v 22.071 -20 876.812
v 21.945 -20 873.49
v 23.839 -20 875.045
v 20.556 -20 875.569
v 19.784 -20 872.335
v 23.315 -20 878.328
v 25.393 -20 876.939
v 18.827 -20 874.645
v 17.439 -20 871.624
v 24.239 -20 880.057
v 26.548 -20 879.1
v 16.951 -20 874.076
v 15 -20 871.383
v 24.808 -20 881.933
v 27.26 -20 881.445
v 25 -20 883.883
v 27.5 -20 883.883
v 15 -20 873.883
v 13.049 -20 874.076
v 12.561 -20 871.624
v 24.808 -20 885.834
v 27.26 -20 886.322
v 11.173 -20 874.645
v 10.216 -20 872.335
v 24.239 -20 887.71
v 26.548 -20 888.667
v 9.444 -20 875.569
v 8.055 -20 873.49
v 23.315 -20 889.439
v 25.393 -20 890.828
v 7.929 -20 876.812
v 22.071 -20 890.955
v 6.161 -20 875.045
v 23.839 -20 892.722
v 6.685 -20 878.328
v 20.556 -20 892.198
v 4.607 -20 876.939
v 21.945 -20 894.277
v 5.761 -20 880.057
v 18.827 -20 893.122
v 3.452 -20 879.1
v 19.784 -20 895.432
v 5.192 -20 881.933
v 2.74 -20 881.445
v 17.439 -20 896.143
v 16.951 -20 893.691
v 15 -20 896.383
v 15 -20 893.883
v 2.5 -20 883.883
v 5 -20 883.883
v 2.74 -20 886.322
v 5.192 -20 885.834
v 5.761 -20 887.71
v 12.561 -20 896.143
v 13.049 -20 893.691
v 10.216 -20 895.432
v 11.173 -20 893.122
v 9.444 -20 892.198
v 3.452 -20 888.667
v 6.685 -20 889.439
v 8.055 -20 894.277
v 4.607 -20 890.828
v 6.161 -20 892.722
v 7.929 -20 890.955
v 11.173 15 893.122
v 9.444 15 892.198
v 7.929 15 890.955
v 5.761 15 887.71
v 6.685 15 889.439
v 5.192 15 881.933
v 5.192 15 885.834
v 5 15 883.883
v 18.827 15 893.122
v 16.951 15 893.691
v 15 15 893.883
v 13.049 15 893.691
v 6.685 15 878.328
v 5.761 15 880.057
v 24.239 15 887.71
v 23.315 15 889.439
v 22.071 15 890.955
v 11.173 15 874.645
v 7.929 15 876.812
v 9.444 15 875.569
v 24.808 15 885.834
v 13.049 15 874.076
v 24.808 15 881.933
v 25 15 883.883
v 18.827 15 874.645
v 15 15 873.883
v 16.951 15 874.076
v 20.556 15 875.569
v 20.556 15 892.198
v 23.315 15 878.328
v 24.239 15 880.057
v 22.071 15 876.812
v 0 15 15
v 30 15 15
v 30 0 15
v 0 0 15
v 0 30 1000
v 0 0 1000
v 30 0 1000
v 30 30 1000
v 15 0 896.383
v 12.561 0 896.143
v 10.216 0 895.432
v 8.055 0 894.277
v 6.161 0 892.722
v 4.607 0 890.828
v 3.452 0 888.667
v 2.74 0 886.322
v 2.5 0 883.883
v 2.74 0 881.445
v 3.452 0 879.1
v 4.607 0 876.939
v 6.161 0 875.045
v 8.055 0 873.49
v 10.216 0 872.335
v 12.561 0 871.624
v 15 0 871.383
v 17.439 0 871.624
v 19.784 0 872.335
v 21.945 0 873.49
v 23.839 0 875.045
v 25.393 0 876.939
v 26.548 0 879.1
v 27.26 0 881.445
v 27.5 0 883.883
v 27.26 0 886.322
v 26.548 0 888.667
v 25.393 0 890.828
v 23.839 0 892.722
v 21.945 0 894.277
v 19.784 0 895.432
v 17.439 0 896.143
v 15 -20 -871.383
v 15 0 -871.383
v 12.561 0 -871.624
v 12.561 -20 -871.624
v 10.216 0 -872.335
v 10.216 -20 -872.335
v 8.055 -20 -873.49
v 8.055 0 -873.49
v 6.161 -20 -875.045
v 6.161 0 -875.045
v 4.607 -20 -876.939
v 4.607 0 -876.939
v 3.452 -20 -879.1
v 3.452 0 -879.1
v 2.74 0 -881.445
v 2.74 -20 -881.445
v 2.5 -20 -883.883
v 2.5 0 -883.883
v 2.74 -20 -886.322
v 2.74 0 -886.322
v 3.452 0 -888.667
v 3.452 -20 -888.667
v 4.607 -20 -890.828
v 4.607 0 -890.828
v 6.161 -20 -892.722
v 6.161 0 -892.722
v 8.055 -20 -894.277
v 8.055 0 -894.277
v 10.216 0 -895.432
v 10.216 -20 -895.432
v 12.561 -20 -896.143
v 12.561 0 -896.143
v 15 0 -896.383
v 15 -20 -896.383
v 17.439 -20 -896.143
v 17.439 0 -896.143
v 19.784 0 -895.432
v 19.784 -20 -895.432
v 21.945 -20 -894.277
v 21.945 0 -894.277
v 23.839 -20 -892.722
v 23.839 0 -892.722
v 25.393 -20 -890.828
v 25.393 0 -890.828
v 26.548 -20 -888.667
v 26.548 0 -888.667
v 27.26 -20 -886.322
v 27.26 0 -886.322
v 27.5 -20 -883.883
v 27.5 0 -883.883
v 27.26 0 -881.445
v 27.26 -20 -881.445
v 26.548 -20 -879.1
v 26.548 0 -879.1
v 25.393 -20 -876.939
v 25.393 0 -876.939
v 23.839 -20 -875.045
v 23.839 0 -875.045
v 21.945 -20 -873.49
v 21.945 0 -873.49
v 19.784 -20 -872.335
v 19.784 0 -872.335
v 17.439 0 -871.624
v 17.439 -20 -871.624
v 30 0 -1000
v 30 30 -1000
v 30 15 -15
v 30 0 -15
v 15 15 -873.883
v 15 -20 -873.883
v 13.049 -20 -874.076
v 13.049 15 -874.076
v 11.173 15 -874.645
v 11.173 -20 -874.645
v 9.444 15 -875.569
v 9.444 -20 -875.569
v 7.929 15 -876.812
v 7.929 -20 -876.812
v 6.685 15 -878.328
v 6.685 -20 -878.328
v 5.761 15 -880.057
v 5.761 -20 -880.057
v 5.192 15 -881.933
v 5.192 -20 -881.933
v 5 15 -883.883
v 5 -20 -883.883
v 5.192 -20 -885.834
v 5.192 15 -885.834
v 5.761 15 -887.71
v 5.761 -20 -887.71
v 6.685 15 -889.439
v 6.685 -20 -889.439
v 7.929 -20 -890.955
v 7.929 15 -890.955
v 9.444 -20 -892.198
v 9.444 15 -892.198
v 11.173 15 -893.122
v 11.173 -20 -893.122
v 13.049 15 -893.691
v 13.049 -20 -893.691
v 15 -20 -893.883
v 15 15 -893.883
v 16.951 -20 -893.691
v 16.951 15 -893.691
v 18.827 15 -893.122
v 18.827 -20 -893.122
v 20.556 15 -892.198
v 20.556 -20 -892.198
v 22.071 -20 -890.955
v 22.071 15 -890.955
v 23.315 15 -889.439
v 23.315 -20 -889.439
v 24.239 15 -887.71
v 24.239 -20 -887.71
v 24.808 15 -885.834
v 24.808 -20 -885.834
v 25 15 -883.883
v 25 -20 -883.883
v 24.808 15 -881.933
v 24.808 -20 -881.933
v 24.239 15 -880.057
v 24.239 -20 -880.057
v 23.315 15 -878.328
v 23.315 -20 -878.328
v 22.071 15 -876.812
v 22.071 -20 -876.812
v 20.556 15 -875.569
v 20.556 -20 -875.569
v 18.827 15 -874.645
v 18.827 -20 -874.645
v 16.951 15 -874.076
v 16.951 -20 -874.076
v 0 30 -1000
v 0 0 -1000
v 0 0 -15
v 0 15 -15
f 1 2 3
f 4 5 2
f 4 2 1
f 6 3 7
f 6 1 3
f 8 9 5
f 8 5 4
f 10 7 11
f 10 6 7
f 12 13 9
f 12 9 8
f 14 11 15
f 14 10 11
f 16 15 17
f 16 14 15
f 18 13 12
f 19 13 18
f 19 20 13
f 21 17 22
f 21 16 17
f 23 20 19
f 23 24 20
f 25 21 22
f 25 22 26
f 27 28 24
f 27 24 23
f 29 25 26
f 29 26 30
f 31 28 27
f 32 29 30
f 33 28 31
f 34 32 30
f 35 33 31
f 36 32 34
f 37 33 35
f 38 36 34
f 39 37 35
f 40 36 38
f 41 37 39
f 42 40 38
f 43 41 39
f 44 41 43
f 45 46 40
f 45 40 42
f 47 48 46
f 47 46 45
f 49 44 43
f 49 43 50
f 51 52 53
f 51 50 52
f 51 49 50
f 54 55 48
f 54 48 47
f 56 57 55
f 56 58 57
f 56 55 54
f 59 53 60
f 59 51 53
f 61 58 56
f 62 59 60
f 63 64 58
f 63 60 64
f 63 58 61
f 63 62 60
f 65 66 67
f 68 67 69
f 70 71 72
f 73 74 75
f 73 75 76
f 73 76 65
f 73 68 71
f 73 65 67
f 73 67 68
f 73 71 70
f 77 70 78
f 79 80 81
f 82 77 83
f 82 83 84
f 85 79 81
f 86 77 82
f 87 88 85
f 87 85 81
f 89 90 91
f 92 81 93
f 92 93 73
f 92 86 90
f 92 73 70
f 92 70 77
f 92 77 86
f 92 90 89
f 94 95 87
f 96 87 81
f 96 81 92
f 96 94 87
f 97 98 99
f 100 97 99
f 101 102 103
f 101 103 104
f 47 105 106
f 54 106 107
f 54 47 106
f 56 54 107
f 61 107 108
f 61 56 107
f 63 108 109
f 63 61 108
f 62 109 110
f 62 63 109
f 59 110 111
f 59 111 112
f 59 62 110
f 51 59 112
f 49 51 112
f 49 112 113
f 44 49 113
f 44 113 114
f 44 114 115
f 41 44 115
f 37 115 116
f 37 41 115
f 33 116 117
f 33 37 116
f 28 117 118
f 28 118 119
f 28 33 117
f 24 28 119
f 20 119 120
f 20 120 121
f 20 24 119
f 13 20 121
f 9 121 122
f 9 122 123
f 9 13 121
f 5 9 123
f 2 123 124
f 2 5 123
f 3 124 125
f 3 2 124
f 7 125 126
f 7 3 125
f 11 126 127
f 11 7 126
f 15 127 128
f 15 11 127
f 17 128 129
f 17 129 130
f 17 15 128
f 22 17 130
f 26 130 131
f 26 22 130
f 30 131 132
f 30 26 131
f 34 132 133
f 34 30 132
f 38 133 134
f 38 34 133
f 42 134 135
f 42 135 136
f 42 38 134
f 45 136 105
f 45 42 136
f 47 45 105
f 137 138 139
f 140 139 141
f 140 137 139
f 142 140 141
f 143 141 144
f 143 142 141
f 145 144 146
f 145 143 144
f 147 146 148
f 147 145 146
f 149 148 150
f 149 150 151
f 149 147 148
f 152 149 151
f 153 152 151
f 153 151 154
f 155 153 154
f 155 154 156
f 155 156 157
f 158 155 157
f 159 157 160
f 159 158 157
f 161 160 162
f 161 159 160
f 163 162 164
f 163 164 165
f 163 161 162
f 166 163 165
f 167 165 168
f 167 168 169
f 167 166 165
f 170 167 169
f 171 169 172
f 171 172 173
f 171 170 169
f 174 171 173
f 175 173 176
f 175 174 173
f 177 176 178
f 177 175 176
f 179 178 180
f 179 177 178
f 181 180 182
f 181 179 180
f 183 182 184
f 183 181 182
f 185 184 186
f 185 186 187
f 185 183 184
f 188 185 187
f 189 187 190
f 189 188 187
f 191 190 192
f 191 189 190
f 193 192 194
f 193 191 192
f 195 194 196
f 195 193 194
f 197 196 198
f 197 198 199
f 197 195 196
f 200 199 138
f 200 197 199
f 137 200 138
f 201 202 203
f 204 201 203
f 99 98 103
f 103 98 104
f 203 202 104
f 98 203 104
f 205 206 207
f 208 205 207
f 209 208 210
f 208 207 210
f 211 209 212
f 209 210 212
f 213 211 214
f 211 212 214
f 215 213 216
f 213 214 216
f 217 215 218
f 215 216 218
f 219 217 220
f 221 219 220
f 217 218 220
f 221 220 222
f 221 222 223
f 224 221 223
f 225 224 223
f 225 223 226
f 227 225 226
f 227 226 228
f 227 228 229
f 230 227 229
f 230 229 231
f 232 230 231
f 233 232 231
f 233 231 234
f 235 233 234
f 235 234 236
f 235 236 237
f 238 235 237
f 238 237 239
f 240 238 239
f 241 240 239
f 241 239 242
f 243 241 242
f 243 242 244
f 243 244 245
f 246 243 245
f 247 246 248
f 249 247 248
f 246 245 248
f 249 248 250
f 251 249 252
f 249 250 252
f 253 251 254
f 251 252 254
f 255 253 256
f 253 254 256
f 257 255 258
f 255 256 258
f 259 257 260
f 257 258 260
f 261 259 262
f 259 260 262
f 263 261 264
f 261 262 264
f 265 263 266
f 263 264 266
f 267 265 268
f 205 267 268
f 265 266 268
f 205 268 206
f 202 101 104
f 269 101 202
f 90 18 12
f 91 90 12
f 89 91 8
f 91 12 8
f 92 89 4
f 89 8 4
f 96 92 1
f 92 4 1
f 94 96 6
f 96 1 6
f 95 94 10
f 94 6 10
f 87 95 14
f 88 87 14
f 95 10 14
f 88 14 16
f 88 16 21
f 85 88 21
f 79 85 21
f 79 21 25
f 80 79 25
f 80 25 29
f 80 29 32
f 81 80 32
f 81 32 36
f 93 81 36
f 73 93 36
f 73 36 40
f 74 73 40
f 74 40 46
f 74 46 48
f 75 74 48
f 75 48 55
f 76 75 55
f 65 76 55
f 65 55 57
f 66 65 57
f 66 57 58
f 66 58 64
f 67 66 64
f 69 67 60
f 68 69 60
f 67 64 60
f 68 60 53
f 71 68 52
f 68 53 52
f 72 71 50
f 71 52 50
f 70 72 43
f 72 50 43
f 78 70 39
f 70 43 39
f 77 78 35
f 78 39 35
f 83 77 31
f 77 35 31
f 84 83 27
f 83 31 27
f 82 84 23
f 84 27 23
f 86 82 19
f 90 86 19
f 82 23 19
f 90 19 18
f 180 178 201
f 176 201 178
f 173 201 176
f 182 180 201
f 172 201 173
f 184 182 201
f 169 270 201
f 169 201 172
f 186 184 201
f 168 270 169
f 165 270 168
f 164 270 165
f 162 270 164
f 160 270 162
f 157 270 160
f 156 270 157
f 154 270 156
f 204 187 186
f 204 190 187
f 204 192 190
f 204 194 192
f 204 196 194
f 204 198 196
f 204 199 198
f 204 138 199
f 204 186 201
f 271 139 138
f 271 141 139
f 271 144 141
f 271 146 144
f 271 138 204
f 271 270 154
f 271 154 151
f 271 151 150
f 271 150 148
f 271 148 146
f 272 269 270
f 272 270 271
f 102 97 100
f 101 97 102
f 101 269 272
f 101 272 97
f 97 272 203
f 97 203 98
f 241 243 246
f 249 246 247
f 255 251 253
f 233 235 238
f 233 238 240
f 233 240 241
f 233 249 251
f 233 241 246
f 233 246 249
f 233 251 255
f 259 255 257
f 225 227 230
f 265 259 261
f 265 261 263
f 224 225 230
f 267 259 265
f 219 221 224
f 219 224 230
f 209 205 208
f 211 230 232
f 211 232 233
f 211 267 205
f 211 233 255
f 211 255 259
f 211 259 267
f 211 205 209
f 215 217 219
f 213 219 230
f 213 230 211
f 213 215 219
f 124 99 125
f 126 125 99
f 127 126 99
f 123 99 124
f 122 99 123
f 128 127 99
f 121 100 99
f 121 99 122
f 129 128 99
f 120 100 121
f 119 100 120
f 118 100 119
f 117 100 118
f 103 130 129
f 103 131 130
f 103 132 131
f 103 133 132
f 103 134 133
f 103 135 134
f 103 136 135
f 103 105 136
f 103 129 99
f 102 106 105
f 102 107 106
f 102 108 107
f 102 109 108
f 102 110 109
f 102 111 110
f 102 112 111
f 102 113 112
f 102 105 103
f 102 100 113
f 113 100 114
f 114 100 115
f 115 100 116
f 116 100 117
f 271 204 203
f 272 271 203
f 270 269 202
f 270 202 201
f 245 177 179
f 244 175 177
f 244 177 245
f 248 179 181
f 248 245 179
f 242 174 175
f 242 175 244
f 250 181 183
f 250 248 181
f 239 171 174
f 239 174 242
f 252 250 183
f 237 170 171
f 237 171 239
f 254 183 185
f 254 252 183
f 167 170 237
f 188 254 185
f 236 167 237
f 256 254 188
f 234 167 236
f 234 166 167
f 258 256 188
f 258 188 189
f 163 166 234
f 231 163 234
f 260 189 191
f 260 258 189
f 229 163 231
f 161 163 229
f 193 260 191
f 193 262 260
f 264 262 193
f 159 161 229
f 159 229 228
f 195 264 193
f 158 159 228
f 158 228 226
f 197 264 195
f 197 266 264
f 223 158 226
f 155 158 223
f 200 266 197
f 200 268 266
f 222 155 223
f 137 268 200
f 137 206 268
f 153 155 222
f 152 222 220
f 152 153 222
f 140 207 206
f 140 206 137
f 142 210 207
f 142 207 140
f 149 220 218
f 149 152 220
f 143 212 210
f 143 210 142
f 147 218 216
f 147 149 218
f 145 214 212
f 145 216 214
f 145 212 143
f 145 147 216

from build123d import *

# Parameters (mm, degrees)
EXTRUDE_1_DEPTH     = 30
SKETCH_2_R          = 10
CUT_EXTRUDE_1_DEPTH = 15
EXTRUDE_START       = 20
SKETCH_3_R          = 12.5
SKETCH_3_R_2        = 10
EXTRUDE_2_DEPTH     = 20


with BuildPart() as part:
    # 草图1 → 凸台-拉伸1 (new body)
    with BuildSketch(Plane(origin=(0, 0, 0), x_dir=(0, 0, -1), z_dir=(1, 0, 0))):
        Polygon((-1000, 30), (1000, 30), (1000, 0), (15, 0), (15, 15), (-15, 15), (-15, 0), (-1000, 0), align=None)
    extrude(amount=EXTRUDE_1_DEPTH)

    # 草图2 → 切除-拉伸1 (cut)
    with BuildSketch(Plane.XZ):
        with Locations(Location((15, 883.8834765, 0), (0, 0, 270))):
            Circle(SKETCH_2_R)
        with Locations(Location((15, -883.8834765, 0), (0, 0, 90))):
            Circle(SKETCH_2_R)
    extrude(amount=-CUT_EXTRUDE_1_DEPTH, mode=Mode.SUBTRACT)

    # 草图3 → 凸台-拉伸2 (add)
    # profile 1 of 2: a face of its own
    with BuildSketch(Plane.XZ.offset(EXTRUDE_START)):
        with Locations(Location((15, 883.8834765, 0), (0, 0, 90))):
            Circle(SKETCH_3_R)
        with Locations(Location((15, 883.8834765, 0), (0, 0, 270))):
            Circle(SKETCH_3_R_2, mode=Mode.SUBTRACT)
    # profile 2 of 2: a face of its own
    with BuildSketch(Plane.XZ.offset(EXTRUDE_START)):
        with Locations(Location((15, -883.8834765, 0), (0, 0, 90))):
            Circle(SKETCH_3_R)
        with Locations(Location((15, -883.8834765, 0), (0, 0, 90))):
            Circle(SKETCH_3_R_2, mode=Mode.SUBTRACT)
    extrude(amount=-EXTRUDE_2_DEPTH)


solid = part.part
